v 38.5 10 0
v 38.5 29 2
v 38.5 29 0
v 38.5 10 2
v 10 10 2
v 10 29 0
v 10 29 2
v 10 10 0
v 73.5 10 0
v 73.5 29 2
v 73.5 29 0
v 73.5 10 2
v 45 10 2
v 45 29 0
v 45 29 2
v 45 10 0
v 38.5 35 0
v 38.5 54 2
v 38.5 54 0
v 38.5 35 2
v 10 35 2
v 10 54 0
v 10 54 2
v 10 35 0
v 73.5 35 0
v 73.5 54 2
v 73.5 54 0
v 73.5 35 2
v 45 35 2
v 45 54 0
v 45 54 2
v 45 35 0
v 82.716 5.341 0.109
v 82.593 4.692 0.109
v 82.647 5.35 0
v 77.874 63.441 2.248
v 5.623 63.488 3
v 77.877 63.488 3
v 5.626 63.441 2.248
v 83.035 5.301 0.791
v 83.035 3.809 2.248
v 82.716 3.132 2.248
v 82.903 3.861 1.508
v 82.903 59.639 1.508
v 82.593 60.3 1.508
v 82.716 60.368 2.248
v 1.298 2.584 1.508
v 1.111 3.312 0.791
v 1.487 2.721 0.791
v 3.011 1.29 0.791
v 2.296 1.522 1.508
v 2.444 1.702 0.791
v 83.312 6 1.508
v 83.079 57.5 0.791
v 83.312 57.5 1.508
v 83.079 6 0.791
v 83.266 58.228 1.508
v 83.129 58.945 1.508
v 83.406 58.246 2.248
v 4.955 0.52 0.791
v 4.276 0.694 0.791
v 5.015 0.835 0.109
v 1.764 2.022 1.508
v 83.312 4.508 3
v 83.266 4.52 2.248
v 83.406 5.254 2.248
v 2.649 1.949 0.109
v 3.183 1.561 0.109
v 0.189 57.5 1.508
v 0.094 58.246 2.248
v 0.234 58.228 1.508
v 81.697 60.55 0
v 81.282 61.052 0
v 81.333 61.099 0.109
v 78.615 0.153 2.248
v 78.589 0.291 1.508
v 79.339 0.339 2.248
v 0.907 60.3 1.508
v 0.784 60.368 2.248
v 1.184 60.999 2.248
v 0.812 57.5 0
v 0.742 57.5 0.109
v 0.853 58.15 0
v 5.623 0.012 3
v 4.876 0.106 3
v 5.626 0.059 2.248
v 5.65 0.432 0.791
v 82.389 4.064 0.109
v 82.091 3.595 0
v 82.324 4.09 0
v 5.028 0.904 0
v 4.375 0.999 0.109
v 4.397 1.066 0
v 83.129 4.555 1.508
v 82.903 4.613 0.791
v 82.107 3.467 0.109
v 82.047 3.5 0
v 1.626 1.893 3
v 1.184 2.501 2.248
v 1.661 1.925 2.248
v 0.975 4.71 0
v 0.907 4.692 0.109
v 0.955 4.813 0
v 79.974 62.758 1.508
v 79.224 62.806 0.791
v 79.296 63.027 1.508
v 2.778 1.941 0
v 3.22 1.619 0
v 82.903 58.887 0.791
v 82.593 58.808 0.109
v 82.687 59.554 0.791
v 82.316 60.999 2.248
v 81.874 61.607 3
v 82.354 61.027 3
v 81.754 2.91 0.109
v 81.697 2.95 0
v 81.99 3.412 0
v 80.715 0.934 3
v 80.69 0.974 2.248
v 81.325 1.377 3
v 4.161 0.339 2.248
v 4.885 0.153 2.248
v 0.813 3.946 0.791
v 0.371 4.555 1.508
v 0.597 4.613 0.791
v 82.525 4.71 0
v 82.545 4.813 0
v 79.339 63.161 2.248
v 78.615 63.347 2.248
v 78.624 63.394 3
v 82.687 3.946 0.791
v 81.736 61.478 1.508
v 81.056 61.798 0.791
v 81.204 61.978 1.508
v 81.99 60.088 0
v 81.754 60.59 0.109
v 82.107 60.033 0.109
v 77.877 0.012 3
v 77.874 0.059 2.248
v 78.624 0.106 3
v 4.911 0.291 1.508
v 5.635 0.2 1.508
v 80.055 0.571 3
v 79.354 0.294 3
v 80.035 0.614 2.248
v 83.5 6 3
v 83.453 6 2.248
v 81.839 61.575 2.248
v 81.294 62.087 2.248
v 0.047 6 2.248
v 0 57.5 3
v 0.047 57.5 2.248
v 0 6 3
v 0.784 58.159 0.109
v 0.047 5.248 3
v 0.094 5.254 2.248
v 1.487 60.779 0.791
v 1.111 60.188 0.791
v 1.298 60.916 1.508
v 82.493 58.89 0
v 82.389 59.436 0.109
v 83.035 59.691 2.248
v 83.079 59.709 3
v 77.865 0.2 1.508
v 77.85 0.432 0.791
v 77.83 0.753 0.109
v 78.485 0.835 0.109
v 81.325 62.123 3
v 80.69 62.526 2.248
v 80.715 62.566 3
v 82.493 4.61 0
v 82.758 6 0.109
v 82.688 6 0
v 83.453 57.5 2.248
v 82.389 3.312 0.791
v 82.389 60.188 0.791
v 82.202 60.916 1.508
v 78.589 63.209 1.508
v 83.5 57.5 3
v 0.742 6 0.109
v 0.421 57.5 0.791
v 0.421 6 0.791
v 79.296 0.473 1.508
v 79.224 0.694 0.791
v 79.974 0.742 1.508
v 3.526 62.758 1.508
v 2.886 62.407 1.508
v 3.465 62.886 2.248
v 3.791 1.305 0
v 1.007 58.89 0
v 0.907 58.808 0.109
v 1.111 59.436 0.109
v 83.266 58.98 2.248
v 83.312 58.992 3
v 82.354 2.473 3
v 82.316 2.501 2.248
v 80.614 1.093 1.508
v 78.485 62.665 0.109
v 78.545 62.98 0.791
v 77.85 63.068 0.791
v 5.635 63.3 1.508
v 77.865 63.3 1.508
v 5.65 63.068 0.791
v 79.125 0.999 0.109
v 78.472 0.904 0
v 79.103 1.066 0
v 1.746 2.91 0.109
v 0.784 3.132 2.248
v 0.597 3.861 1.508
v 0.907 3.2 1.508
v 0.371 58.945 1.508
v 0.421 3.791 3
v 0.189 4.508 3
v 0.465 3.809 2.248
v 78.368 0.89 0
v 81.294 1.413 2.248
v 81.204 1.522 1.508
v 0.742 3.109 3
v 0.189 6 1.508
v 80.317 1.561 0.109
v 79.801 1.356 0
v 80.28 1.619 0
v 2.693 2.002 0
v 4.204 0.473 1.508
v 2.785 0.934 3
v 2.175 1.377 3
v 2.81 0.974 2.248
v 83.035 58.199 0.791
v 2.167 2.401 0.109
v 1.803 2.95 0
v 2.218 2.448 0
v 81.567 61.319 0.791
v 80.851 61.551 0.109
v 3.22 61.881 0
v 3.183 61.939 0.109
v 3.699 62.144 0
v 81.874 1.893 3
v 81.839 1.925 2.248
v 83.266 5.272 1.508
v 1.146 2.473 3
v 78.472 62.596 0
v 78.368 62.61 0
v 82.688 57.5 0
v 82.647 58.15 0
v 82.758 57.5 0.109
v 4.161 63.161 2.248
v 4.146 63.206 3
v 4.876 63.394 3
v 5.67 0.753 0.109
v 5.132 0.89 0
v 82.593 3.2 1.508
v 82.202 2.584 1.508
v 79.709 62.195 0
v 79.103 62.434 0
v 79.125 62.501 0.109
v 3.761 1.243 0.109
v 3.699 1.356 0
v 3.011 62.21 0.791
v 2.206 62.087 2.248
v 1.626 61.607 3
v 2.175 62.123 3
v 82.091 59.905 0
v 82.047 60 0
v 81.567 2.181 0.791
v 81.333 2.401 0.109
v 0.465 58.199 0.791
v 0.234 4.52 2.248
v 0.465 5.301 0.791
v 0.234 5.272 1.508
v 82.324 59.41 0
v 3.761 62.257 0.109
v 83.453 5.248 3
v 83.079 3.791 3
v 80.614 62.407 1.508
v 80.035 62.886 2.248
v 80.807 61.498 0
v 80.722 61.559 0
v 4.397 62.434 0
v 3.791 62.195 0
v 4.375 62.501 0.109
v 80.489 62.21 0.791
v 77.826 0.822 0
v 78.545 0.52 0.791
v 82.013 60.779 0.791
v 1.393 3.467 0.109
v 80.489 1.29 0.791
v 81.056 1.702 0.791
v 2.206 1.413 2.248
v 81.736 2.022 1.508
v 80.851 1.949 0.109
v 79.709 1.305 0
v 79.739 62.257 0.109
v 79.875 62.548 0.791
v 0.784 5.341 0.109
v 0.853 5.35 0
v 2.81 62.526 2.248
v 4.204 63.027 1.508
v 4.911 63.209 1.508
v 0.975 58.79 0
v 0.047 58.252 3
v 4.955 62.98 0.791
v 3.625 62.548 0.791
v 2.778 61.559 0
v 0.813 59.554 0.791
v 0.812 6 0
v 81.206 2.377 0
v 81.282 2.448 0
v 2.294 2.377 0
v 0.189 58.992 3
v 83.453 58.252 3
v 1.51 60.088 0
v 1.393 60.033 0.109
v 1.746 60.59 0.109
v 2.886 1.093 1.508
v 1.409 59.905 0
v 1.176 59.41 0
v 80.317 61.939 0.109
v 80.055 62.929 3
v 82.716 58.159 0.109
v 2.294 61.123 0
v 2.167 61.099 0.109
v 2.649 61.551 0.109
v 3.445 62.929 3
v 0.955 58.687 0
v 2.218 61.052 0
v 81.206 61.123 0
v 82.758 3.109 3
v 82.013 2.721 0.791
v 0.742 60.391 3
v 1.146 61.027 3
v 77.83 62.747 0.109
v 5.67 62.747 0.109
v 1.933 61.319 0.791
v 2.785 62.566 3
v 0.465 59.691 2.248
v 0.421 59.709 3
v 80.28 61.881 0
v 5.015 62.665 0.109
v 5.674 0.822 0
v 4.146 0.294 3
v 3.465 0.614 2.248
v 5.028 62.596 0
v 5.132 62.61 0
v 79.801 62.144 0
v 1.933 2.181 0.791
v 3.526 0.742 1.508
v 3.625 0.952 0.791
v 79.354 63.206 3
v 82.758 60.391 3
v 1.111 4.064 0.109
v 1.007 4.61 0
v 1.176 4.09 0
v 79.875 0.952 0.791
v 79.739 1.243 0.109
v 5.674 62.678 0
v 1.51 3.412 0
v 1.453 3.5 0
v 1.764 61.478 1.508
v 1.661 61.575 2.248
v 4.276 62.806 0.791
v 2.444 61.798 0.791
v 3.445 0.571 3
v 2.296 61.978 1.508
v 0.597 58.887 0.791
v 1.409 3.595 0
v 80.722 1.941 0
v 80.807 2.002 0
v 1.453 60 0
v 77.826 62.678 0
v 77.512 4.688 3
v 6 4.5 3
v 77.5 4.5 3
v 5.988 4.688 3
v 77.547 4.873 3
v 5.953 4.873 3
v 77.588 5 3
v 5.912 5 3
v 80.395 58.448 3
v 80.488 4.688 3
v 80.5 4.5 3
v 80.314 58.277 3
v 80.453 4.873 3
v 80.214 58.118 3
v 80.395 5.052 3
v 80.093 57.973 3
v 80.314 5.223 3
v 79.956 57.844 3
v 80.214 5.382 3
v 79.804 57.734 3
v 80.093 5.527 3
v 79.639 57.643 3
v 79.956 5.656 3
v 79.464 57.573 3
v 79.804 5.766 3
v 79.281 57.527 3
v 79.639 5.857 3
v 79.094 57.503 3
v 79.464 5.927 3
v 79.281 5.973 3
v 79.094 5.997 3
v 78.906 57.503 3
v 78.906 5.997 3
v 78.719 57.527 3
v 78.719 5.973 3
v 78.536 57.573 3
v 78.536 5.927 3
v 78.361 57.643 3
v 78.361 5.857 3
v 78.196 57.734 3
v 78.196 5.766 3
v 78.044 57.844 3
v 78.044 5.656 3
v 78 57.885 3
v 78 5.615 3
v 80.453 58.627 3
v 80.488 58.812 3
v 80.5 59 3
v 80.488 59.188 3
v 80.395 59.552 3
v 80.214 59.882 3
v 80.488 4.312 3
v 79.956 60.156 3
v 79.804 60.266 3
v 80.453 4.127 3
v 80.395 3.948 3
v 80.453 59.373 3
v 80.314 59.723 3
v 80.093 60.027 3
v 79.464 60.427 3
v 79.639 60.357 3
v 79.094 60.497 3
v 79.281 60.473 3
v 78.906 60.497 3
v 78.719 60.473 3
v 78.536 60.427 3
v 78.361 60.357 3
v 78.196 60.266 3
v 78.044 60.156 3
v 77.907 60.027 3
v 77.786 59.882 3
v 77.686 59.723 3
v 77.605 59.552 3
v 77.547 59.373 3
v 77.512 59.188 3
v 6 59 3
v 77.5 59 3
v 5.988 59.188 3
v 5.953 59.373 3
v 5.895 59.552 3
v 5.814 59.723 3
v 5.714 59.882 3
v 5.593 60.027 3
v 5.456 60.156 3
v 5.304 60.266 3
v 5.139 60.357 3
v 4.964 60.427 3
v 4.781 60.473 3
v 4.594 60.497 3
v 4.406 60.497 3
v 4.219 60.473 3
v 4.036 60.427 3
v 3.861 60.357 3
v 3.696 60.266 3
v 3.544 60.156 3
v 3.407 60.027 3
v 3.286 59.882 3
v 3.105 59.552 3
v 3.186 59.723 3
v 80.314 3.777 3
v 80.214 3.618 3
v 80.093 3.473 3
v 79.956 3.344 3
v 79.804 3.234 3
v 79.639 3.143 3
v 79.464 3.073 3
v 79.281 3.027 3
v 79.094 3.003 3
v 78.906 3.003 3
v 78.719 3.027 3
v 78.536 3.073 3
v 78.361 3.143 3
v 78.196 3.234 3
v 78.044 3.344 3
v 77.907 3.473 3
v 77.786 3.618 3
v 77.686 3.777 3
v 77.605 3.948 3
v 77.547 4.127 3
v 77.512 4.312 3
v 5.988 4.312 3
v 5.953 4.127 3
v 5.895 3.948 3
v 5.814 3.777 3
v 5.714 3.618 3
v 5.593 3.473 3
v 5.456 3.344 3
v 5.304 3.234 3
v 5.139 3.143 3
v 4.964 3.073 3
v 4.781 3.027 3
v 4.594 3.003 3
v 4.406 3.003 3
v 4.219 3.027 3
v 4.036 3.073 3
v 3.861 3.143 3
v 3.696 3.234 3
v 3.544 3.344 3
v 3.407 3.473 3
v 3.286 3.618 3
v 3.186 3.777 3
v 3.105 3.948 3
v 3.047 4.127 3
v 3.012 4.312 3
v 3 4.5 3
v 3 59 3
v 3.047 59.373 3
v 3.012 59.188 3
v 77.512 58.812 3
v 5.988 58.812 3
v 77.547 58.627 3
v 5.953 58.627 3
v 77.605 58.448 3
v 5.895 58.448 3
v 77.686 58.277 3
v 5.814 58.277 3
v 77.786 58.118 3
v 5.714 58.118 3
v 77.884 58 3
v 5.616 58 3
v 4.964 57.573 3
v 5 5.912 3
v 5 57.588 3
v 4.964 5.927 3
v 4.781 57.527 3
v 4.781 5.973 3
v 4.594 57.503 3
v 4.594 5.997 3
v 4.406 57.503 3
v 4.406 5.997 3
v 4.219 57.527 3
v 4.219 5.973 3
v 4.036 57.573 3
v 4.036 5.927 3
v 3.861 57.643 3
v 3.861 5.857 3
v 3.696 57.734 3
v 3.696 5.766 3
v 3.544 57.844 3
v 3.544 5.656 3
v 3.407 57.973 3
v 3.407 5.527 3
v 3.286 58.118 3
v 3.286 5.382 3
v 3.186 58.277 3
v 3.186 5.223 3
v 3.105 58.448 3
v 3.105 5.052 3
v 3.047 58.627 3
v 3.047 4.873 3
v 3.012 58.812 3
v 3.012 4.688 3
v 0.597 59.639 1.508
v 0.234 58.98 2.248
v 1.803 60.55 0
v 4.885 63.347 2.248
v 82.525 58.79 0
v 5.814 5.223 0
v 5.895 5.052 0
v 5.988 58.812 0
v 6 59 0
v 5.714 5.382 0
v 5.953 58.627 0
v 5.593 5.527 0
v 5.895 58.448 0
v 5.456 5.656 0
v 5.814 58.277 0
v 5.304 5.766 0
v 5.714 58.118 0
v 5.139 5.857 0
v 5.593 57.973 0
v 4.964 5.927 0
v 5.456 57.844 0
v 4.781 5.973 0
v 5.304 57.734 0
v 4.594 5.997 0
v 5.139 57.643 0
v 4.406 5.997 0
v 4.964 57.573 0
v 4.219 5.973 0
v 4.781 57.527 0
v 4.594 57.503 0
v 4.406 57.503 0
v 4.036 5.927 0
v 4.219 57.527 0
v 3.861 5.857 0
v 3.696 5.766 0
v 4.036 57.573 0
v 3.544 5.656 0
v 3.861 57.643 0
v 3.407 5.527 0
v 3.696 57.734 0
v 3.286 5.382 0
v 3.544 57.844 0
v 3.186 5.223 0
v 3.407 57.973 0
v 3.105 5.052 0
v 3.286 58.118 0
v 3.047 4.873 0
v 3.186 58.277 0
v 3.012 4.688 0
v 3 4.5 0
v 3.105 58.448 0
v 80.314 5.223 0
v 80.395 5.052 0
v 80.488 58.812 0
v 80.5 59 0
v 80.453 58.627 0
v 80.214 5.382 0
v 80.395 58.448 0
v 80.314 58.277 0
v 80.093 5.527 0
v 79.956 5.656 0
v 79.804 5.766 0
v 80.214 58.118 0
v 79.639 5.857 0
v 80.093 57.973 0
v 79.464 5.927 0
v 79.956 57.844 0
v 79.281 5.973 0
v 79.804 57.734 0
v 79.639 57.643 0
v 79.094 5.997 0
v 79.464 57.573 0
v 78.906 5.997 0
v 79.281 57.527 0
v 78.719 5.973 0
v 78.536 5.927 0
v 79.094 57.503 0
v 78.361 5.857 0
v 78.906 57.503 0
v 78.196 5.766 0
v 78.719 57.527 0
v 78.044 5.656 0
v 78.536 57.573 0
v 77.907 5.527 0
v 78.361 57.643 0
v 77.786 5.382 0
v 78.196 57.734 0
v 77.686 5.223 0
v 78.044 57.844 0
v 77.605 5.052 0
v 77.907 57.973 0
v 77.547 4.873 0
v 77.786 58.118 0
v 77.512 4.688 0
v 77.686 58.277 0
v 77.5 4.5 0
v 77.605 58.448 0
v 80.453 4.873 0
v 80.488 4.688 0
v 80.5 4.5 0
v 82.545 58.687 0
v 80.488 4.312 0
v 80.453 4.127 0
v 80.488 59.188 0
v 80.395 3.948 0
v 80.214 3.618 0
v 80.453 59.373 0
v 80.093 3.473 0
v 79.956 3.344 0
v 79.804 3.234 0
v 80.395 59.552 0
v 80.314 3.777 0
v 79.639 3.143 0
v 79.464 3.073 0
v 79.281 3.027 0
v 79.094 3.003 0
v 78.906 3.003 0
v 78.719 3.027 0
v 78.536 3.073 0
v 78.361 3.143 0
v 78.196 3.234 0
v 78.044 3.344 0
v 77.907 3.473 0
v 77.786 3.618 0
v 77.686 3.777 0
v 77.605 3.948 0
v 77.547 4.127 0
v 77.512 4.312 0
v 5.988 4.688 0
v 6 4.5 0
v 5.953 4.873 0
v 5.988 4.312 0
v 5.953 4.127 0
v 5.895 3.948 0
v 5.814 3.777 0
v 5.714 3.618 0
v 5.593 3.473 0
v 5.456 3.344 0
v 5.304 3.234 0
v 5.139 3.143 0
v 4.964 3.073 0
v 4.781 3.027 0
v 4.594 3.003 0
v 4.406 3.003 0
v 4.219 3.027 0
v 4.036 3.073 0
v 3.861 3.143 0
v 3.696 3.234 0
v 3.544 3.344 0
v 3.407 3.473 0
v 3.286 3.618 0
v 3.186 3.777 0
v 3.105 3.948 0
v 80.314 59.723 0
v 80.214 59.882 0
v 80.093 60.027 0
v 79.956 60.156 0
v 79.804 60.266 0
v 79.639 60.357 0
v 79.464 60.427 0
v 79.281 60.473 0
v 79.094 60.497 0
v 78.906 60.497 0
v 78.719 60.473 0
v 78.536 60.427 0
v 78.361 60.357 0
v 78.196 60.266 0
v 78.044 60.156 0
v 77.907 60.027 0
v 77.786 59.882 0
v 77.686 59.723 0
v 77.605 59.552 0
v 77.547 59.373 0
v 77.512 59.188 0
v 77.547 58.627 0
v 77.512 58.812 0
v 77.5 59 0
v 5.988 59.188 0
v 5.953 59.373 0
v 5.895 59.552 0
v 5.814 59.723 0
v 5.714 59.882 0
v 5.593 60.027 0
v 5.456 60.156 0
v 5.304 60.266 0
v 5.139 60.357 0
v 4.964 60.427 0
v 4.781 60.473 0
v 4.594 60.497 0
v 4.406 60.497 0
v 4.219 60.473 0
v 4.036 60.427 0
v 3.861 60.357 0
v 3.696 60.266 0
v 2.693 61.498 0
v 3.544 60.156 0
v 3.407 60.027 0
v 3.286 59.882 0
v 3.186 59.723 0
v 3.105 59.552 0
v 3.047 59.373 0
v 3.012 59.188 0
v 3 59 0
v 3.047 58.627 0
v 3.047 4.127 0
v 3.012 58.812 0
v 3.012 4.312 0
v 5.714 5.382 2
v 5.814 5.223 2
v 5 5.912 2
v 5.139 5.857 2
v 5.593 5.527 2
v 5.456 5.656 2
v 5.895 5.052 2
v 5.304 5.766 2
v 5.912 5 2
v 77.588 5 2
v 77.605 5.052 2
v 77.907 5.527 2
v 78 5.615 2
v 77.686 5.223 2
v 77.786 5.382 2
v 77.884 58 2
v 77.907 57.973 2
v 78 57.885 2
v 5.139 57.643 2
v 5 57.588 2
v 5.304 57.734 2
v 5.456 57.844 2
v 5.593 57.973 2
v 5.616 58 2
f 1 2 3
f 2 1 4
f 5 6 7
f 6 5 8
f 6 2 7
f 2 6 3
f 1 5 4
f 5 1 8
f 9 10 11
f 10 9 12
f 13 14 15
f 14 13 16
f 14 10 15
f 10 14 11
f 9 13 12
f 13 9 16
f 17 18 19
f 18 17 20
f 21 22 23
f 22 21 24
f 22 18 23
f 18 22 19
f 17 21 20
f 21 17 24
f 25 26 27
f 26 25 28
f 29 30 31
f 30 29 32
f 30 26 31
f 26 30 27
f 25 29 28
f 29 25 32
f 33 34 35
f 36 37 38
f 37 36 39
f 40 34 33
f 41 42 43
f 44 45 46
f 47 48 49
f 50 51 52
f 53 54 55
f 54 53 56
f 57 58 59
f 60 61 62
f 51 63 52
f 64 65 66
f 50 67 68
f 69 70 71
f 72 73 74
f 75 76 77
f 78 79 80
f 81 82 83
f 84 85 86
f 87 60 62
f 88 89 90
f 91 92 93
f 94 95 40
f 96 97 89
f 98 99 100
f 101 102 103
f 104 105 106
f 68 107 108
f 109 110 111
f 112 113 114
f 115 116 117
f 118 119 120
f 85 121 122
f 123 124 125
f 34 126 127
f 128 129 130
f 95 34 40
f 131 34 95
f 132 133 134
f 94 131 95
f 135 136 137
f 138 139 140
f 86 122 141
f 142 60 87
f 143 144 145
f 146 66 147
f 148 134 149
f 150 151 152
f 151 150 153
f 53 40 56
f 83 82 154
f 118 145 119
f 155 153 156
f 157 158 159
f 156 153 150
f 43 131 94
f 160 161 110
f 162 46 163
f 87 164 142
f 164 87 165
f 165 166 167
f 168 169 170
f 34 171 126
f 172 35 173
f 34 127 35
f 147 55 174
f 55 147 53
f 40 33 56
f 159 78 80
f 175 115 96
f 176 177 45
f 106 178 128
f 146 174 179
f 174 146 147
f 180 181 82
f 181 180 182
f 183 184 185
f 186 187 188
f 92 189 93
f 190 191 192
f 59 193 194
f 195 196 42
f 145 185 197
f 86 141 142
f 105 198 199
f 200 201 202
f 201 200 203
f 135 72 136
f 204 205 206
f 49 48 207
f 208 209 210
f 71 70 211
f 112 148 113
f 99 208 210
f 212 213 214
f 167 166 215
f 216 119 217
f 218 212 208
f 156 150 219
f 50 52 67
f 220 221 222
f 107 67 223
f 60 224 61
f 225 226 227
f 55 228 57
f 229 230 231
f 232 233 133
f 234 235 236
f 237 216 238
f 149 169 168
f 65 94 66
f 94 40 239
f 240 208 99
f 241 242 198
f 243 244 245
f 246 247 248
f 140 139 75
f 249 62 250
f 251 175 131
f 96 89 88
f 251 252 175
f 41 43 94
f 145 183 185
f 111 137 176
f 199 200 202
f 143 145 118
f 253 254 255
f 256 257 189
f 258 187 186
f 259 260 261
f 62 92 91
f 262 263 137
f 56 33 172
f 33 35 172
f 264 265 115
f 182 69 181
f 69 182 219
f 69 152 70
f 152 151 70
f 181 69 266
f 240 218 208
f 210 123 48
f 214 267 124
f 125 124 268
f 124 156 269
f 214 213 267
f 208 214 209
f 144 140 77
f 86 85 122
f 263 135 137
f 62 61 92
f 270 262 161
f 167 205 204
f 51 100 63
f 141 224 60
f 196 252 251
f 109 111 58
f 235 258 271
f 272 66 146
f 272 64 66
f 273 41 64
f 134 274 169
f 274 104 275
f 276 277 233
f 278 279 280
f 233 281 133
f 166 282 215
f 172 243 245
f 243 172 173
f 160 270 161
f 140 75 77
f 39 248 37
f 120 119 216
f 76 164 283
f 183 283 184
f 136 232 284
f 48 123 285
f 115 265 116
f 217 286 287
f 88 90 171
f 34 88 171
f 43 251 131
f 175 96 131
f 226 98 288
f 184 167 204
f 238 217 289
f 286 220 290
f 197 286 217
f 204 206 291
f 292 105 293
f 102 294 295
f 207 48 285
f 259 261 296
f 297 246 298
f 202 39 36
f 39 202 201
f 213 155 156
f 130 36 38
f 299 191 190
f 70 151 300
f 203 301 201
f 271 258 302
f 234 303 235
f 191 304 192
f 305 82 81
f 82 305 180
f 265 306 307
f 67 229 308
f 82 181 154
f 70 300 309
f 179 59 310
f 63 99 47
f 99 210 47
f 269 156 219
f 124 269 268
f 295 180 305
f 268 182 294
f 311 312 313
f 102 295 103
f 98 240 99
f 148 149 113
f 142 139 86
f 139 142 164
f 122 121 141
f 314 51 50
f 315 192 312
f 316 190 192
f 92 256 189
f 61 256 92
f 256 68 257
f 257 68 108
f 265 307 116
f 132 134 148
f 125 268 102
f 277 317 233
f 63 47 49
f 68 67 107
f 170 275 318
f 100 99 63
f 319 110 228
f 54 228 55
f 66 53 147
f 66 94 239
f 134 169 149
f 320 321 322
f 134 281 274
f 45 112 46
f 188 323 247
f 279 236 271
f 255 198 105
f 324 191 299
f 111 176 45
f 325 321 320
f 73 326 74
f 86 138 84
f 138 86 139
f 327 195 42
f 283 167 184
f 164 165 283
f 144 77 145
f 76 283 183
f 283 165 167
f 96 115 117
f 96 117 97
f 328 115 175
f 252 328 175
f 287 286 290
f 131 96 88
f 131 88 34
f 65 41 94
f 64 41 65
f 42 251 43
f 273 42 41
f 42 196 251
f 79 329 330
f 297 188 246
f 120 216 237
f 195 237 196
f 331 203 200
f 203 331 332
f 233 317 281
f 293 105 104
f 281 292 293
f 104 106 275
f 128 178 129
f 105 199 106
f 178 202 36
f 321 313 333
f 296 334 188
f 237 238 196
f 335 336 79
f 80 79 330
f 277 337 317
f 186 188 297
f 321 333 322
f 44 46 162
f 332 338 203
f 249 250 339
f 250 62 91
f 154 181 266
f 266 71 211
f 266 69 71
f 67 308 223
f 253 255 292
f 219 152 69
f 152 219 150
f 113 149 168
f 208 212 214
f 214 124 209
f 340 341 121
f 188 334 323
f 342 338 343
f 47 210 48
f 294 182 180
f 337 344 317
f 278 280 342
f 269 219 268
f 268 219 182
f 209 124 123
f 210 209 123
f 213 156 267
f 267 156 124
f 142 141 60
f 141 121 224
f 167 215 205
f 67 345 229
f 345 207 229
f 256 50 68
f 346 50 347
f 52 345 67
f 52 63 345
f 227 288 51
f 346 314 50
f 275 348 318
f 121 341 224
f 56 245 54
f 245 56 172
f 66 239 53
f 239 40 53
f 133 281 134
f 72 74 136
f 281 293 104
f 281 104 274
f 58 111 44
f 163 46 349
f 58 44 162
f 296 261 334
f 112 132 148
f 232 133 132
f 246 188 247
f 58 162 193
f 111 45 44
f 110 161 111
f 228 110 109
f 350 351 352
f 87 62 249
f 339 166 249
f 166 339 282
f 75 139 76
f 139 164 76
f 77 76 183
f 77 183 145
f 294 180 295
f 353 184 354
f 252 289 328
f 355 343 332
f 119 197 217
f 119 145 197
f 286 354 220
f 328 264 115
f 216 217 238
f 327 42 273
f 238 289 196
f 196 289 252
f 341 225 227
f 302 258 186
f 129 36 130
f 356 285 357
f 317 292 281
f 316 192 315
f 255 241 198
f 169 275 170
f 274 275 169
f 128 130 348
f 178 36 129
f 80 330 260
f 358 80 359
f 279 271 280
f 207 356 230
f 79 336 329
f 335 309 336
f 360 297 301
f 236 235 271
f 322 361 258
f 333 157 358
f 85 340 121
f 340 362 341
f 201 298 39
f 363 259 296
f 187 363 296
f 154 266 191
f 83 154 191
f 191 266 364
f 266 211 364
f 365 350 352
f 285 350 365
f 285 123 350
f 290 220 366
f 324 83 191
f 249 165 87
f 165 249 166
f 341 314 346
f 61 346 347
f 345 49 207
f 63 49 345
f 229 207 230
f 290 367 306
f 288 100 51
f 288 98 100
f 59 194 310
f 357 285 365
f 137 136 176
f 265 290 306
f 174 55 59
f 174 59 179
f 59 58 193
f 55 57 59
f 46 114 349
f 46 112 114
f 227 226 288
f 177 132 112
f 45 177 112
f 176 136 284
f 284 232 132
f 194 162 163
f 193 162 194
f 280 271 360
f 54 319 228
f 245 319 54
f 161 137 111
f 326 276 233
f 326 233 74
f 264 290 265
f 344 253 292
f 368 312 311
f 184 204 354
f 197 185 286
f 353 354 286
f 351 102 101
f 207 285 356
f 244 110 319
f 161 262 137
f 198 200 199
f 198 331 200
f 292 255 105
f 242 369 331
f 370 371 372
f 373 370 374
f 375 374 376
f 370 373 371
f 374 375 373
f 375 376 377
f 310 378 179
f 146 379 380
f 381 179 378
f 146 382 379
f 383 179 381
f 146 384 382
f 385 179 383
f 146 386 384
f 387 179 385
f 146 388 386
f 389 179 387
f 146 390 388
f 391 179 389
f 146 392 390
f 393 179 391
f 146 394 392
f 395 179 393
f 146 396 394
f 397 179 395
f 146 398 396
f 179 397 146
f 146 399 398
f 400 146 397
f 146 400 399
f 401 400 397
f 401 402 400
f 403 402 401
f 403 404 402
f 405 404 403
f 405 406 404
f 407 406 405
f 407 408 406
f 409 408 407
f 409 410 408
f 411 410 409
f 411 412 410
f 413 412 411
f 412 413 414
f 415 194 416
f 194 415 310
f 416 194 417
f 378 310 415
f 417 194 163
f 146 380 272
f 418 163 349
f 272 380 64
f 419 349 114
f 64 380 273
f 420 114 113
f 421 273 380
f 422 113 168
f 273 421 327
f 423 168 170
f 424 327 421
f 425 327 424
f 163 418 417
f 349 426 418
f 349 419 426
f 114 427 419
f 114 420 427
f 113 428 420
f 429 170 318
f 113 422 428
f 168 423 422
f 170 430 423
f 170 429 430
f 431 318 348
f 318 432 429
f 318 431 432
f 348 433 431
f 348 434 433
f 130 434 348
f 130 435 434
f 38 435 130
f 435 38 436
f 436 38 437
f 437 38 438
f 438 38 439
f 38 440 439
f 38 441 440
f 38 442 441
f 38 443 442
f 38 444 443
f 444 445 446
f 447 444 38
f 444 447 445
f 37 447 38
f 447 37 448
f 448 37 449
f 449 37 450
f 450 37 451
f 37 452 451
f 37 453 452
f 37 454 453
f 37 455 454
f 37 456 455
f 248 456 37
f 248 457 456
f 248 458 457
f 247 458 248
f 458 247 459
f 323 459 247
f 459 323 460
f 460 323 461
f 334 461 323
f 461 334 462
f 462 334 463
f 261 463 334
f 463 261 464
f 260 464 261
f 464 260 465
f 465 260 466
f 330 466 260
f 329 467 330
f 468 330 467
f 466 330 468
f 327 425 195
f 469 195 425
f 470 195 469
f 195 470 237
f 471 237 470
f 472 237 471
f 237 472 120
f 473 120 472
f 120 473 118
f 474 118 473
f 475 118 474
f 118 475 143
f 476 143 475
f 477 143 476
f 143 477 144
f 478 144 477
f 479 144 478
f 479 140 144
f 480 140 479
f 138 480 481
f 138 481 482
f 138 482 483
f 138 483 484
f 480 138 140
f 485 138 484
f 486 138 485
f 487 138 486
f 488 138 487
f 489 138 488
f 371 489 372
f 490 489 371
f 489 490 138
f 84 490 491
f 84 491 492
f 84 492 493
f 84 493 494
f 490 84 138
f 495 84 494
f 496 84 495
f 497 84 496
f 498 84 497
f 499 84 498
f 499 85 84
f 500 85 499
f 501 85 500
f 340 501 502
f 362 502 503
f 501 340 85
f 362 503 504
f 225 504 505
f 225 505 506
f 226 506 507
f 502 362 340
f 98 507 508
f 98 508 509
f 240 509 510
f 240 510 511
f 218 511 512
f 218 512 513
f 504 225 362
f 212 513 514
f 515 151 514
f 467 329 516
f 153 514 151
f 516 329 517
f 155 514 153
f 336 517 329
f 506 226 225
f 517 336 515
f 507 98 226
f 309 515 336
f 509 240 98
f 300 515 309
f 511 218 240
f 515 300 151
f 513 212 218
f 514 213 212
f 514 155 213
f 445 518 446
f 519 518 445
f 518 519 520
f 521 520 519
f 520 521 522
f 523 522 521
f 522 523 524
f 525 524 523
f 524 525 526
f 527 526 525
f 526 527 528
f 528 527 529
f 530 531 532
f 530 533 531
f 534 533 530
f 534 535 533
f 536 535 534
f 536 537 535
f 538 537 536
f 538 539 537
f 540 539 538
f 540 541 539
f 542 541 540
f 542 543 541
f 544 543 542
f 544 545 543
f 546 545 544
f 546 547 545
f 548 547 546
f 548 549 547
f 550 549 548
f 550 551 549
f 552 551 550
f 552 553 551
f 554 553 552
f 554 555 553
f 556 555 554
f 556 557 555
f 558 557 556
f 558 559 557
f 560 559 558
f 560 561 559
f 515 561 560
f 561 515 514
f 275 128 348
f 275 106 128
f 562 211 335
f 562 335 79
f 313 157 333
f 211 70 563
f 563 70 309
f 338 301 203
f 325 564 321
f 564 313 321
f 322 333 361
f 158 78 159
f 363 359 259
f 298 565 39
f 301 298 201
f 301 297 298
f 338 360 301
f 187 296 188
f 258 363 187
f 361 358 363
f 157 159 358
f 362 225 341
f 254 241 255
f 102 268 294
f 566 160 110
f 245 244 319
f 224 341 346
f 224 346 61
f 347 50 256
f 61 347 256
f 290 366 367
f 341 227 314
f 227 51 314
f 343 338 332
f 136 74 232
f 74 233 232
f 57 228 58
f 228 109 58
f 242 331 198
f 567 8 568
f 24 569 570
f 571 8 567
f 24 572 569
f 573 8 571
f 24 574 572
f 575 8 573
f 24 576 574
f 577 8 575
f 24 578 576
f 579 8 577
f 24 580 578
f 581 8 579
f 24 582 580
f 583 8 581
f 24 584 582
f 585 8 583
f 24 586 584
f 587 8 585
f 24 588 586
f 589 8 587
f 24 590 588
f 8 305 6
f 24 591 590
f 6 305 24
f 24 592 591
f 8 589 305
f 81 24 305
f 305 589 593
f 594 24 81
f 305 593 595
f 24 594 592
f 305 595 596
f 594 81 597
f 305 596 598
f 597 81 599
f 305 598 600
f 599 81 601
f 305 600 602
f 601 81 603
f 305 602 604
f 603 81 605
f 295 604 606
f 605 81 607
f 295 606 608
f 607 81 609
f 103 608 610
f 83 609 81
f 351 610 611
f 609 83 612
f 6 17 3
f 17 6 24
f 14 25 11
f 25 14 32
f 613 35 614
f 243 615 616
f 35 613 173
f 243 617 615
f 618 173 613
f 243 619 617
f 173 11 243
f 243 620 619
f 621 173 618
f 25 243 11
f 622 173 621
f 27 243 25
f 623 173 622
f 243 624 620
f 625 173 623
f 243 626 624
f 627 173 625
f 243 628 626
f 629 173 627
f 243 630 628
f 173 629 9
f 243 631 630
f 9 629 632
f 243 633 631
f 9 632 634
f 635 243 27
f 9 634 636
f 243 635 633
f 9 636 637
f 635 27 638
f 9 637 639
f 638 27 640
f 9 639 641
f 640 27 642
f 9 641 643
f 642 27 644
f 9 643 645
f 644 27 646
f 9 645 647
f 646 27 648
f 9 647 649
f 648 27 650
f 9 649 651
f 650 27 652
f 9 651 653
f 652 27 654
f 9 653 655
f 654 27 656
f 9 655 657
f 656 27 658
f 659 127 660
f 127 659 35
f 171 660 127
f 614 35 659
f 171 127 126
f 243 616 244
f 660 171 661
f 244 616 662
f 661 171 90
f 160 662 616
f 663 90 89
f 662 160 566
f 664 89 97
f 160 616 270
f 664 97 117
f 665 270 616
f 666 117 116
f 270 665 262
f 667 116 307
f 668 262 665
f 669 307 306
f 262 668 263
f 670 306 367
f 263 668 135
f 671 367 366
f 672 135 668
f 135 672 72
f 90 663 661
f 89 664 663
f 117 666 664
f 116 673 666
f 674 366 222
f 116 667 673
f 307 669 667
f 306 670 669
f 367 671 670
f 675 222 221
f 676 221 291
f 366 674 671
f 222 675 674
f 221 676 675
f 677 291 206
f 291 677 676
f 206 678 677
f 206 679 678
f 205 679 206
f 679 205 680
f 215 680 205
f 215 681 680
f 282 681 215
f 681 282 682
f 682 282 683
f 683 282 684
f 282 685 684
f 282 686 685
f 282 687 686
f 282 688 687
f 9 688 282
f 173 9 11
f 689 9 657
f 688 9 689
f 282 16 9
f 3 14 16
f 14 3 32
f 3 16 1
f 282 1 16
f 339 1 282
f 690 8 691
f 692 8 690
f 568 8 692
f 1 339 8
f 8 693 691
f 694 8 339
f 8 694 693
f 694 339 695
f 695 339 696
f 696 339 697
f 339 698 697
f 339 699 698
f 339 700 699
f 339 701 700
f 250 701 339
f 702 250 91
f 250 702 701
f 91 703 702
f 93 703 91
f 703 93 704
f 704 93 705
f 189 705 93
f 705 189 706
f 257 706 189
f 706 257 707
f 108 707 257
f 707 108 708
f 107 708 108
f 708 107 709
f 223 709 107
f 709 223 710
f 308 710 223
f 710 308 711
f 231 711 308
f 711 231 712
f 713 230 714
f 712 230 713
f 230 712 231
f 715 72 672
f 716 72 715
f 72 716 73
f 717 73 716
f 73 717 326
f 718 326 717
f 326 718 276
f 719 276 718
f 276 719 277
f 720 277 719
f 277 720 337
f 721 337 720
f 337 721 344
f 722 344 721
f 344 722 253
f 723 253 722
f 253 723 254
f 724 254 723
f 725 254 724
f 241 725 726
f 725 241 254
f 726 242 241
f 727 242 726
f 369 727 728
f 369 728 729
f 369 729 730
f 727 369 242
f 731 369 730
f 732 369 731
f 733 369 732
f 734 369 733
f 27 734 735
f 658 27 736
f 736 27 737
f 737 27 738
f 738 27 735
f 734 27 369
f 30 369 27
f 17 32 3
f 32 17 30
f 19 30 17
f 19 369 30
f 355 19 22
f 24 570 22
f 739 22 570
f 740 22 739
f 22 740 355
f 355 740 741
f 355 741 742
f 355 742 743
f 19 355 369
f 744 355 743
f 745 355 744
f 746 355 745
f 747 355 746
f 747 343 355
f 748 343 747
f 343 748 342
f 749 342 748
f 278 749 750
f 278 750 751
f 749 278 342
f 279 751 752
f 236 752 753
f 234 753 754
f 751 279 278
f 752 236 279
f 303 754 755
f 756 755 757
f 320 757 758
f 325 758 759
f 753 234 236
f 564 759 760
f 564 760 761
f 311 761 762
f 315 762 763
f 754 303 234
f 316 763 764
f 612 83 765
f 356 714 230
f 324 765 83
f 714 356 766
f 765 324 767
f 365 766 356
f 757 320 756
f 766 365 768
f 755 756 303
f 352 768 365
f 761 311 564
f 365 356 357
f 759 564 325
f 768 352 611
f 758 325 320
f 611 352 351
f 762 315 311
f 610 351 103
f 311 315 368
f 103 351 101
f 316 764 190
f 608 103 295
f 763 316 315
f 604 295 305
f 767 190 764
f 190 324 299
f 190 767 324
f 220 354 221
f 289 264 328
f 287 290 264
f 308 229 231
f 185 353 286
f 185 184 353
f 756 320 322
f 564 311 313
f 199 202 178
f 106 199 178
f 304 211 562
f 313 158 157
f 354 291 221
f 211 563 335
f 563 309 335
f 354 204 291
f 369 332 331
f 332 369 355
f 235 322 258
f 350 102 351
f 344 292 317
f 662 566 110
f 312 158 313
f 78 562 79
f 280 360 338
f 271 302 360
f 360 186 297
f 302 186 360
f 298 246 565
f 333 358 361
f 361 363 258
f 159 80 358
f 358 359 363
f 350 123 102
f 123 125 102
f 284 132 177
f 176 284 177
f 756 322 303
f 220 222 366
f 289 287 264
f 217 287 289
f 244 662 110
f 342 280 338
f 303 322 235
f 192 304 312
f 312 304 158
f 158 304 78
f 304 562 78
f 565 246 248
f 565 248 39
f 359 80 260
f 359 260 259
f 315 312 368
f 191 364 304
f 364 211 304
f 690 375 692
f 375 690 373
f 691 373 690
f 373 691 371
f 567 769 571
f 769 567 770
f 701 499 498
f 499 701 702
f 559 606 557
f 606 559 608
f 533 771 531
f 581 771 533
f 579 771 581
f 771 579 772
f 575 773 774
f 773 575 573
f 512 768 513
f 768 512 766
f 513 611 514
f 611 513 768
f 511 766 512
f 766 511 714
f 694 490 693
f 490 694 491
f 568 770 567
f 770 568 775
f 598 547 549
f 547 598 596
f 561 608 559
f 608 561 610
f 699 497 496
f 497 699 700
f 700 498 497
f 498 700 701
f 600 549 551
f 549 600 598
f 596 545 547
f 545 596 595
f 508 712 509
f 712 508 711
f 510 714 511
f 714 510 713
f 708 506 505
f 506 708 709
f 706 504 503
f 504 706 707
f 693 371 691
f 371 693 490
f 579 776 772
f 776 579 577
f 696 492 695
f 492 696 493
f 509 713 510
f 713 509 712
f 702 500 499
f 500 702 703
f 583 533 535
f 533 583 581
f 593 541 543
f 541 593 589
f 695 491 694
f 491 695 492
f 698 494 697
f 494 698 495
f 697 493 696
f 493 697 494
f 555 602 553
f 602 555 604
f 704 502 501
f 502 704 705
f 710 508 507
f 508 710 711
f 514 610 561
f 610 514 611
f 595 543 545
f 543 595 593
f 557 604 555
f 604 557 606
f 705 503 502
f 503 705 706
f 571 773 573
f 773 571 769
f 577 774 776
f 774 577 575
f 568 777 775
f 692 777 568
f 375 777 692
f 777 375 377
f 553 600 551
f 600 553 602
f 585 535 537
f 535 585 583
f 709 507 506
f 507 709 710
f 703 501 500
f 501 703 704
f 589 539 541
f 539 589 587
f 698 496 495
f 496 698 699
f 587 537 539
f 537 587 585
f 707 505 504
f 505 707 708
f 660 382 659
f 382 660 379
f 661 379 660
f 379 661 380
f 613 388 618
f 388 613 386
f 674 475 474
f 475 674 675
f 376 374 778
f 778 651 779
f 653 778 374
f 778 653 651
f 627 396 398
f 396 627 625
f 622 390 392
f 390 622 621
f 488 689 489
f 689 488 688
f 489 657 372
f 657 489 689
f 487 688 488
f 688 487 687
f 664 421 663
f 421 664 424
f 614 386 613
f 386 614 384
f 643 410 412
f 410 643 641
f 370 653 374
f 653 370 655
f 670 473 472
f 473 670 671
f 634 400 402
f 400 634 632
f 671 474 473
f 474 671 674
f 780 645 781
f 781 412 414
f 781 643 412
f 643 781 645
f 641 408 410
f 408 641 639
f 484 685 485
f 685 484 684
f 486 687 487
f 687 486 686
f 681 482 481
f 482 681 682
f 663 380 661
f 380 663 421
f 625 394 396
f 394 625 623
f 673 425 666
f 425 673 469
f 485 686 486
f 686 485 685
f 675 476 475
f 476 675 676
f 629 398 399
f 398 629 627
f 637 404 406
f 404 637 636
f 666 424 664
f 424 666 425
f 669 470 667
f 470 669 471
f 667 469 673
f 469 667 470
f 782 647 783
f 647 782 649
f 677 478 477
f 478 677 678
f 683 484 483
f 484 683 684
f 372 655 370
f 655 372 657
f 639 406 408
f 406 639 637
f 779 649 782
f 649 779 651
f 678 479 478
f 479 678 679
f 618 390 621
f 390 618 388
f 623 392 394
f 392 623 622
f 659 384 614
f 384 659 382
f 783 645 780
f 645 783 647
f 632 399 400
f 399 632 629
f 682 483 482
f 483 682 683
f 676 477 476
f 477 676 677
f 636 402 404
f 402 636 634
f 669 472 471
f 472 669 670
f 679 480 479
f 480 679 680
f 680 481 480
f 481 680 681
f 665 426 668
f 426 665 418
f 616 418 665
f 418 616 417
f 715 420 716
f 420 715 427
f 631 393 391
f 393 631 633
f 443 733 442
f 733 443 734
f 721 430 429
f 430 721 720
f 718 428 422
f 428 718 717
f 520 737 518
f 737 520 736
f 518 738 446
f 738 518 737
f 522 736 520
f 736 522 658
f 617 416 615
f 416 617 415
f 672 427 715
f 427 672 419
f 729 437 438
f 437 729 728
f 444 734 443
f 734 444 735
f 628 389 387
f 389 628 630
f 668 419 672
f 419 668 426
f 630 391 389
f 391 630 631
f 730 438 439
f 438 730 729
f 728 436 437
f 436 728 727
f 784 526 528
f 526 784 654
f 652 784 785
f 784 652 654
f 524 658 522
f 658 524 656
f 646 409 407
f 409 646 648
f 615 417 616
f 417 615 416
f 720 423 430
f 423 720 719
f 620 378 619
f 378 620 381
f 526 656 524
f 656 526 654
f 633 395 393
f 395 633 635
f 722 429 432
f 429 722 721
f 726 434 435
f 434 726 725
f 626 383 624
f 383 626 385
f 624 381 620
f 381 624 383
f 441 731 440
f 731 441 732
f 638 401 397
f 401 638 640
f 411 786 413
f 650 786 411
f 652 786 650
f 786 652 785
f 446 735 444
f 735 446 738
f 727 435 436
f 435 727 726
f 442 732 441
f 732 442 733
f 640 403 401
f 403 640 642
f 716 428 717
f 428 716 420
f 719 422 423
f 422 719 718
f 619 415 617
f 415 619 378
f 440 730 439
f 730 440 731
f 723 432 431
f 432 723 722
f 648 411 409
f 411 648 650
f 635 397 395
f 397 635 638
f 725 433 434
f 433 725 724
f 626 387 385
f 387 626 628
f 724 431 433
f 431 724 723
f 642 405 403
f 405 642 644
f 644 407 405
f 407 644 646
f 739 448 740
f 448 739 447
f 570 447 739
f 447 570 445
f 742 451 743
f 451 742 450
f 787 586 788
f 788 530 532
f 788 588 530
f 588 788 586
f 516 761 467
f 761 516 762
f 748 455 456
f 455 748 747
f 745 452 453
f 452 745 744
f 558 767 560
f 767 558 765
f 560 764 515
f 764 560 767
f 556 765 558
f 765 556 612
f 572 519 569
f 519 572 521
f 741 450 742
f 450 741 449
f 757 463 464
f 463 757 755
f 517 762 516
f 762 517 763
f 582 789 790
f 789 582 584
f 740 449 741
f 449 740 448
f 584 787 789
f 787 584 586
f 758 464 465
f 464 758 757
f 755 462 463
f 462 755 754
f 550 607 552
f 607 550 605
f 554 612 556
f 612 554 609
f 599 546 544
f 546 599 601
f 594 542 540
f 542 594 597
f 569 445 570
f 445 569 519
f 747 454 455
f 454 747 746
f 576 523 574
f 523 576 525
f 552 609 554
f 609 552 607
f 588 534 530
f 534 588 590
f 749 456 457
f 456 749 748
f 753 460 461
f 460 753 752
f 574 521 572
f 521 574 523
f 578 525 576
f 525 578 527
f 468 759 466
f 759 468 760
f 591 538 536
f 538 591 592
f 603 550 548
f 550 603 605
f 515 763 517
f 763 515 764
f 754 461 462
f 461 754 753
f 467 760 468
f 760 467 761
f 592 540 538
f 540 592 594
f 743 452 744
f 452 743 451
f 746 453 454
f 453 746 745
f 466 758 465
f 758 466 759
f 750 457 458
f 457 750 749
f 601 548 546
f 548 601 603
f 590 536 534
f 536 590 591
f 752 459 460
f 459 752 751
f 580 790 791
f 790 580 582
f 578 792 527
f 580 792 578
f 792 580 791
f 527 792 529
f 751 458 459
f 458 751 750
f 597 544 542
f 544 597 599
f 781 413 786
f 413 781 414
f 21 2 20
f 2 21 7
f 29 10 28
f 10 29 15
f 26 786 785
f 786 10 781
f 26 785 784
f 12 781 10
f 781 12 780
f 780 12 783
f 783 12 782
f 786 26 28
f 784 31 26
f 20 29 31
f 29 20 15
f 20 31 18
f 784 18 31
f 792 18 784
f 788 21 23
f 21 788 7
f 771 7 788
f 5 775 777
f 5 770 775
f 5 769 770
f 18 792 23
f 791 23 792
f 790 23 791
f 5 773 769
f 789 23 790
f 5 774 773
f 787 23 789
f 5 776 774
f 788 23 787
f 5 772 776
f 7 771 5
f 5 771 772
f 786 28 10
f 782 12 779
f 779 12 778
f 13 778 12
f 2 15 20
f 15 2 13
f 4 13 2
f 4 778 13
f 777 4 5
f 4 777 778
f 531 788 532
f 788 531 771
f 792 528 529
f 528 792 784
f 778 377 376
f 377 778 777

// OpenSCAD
// file: face-plate.scad
module truncated_hemisphere(thickness)
{
	r = 2 * thickness;
	difference() {
		translate(v = [0, 0, thickness])
			sphere(r);
		translate(v = [0, 0, -r])
			cube(size = [2 * r, 2 * r, 2 * r], center = true);
		translate(v = [0, 0, 3 * thickness])
			cube(size = [2 * r, 2 * r, 2 * r], center = true);
	}
}

module face_plate(width, height, thickness)
{
	r = 2 * thickness;
	hull() {
		translate(v = [r, r, 0])
			truncated_hemisphere(r / 2);
		translate(v = [width - r, r, 0])
			truncated_hemisphere(r / 2);
		translate(v = [width - r, height - r, 0])
			truncated_hemisphere(r / 2);
		translate(v = [r, height - r, 0])
			truncated_hemisphere(r / 2);
	}
}
// file: large-switch-array-holder.scad
include <face-plate.scad>

/* This file provides 2 functions meant to be used:

   1. switch_array_holder(rows, cols);
   2. switch_holder_retaining_gasket(rows, cols);

*/


$fn = 50;

clearance = 0.5;
width = 33 + clearance;
height = 23 + clearance;
depth = 10;
outer_width = width + 3;
outer_height = height + 3;
edge_width = 6;

module switch_holder_screw_hole()
{
	translate(v = [0, 0, -1])
		cylinder(r1 = 1.5, r2 = 1.5, h = 10);
}

module switch_holder()
{
	translate(v = [0.5 * outer_width, 0.5 * outer_height, 0.5 * depth])
		difference() {
			cube(size = [outer_width, outer_height, depth], center = true);
			cube(size = [width, height, depth + 5], center = true);
		}
}

module switch_holder_array(r, c)
{
	union() {
		for (i = [0 : 1 : r - 1]) {
			translate(v = [0, (height + 1.5) * i, 0]) {
				for (j = [0 : 1 : c - 1]) {
					translate(v = [(width + 1.5) * j, 0, 0]) {
						switch_holder();
					}
				}
			}
		}
	}
}

module switch_holder_face_plate(r, c)
{
	w = c * (width + 1.5) + 1.5;
	h = r * (height + 1.5) + 1.5;
	thickness = 3;

	difference() {
		face_plate(w + 2 * edge_width, h + 2 * edge_width, 3);
		translate(v = [edge_width, edge_width, -3]) {
			cube(size = [w, h, 10]);
		}
		translate(v = [0.75 * edge_width, 0.75 * edge_width, 0])
			switch_holder_screw_hole();
		translate(v = [w + 1.25 * edge_width, 0.75 * edge_width, 0])
			switch_holder_screw_hole();
		translate(v = [w + 1.25 * edge_width, h + 1.25 * edge_width, 0])
			switch_holder_screw_hole();
		translate(v = [0.75 * edge_width, h + 1.25 * edge_width, 0])
			switch_holder_screw_hole();
	}
}

module switch_array_holder(r, c) {
	union() {
		switch_holder_face_plate(r, c);
		translate(v = [edge_width, edge_width, 0])
			switch_holder_array(r, c);
	}
}

module button_port()
{
	translate(v = [0, 0, -5])
		cube(size = [28.5, 19, 15]);
}

module switch_holder_retaining_gasket(r, c)
{
	w = c * (width + 1.5) + 1.5;
	h = r * (height + 1.5) + 1.5;
	difference() {
		face_plate(w + 2 * edge_width, h + 2 * edge_width, 3);
		translate(v = [edge_width + 4 , edge_width + 4, 0])
		for (i = [0 : 1 : r - 1]) {
			translate(v = [0, (height + 1.5) * i, 0]) {
				for (j = [0 : 1 : c - 1]) {
					translate(v = [(width + 1.5) * j, 0, 0]) {
						button_port();
					}
				}
			}
		}
		translate(v = [0.75 * edge_width, 0.75 * edge_width, 0])
			switch_holder_screw_hole();
		translate(v = [w + 1.25 * edge_width, 0.75 * edge_width, 0])
			switch_holder_screw_hole();
		translate(v = [w + 1.25 * edge_width, h + 1.25 * edge_width, 0])
			switch_holder_screw_hole();
		translate(v = [0.75 * edge_width, h + 1.25 * edge_width, 0])
			switch_holder_screw_hole();
		translate(v = [edge_width - 1, edge_width - 1, 2])
			cube(size = [c * (width + 2) + 2, r * (height + 2) + 2, 20]);
	}
}
/*
switch_array_holder(3, 4);
translate(v = [200, 0, 0])
	switch_holder_retaining_gasket(3, 4);
*/
// main file
rows=2;
cols=2;

include <large-switch-array-holder.scad>

switch_holder_retaining_gasket(rows, cols);
